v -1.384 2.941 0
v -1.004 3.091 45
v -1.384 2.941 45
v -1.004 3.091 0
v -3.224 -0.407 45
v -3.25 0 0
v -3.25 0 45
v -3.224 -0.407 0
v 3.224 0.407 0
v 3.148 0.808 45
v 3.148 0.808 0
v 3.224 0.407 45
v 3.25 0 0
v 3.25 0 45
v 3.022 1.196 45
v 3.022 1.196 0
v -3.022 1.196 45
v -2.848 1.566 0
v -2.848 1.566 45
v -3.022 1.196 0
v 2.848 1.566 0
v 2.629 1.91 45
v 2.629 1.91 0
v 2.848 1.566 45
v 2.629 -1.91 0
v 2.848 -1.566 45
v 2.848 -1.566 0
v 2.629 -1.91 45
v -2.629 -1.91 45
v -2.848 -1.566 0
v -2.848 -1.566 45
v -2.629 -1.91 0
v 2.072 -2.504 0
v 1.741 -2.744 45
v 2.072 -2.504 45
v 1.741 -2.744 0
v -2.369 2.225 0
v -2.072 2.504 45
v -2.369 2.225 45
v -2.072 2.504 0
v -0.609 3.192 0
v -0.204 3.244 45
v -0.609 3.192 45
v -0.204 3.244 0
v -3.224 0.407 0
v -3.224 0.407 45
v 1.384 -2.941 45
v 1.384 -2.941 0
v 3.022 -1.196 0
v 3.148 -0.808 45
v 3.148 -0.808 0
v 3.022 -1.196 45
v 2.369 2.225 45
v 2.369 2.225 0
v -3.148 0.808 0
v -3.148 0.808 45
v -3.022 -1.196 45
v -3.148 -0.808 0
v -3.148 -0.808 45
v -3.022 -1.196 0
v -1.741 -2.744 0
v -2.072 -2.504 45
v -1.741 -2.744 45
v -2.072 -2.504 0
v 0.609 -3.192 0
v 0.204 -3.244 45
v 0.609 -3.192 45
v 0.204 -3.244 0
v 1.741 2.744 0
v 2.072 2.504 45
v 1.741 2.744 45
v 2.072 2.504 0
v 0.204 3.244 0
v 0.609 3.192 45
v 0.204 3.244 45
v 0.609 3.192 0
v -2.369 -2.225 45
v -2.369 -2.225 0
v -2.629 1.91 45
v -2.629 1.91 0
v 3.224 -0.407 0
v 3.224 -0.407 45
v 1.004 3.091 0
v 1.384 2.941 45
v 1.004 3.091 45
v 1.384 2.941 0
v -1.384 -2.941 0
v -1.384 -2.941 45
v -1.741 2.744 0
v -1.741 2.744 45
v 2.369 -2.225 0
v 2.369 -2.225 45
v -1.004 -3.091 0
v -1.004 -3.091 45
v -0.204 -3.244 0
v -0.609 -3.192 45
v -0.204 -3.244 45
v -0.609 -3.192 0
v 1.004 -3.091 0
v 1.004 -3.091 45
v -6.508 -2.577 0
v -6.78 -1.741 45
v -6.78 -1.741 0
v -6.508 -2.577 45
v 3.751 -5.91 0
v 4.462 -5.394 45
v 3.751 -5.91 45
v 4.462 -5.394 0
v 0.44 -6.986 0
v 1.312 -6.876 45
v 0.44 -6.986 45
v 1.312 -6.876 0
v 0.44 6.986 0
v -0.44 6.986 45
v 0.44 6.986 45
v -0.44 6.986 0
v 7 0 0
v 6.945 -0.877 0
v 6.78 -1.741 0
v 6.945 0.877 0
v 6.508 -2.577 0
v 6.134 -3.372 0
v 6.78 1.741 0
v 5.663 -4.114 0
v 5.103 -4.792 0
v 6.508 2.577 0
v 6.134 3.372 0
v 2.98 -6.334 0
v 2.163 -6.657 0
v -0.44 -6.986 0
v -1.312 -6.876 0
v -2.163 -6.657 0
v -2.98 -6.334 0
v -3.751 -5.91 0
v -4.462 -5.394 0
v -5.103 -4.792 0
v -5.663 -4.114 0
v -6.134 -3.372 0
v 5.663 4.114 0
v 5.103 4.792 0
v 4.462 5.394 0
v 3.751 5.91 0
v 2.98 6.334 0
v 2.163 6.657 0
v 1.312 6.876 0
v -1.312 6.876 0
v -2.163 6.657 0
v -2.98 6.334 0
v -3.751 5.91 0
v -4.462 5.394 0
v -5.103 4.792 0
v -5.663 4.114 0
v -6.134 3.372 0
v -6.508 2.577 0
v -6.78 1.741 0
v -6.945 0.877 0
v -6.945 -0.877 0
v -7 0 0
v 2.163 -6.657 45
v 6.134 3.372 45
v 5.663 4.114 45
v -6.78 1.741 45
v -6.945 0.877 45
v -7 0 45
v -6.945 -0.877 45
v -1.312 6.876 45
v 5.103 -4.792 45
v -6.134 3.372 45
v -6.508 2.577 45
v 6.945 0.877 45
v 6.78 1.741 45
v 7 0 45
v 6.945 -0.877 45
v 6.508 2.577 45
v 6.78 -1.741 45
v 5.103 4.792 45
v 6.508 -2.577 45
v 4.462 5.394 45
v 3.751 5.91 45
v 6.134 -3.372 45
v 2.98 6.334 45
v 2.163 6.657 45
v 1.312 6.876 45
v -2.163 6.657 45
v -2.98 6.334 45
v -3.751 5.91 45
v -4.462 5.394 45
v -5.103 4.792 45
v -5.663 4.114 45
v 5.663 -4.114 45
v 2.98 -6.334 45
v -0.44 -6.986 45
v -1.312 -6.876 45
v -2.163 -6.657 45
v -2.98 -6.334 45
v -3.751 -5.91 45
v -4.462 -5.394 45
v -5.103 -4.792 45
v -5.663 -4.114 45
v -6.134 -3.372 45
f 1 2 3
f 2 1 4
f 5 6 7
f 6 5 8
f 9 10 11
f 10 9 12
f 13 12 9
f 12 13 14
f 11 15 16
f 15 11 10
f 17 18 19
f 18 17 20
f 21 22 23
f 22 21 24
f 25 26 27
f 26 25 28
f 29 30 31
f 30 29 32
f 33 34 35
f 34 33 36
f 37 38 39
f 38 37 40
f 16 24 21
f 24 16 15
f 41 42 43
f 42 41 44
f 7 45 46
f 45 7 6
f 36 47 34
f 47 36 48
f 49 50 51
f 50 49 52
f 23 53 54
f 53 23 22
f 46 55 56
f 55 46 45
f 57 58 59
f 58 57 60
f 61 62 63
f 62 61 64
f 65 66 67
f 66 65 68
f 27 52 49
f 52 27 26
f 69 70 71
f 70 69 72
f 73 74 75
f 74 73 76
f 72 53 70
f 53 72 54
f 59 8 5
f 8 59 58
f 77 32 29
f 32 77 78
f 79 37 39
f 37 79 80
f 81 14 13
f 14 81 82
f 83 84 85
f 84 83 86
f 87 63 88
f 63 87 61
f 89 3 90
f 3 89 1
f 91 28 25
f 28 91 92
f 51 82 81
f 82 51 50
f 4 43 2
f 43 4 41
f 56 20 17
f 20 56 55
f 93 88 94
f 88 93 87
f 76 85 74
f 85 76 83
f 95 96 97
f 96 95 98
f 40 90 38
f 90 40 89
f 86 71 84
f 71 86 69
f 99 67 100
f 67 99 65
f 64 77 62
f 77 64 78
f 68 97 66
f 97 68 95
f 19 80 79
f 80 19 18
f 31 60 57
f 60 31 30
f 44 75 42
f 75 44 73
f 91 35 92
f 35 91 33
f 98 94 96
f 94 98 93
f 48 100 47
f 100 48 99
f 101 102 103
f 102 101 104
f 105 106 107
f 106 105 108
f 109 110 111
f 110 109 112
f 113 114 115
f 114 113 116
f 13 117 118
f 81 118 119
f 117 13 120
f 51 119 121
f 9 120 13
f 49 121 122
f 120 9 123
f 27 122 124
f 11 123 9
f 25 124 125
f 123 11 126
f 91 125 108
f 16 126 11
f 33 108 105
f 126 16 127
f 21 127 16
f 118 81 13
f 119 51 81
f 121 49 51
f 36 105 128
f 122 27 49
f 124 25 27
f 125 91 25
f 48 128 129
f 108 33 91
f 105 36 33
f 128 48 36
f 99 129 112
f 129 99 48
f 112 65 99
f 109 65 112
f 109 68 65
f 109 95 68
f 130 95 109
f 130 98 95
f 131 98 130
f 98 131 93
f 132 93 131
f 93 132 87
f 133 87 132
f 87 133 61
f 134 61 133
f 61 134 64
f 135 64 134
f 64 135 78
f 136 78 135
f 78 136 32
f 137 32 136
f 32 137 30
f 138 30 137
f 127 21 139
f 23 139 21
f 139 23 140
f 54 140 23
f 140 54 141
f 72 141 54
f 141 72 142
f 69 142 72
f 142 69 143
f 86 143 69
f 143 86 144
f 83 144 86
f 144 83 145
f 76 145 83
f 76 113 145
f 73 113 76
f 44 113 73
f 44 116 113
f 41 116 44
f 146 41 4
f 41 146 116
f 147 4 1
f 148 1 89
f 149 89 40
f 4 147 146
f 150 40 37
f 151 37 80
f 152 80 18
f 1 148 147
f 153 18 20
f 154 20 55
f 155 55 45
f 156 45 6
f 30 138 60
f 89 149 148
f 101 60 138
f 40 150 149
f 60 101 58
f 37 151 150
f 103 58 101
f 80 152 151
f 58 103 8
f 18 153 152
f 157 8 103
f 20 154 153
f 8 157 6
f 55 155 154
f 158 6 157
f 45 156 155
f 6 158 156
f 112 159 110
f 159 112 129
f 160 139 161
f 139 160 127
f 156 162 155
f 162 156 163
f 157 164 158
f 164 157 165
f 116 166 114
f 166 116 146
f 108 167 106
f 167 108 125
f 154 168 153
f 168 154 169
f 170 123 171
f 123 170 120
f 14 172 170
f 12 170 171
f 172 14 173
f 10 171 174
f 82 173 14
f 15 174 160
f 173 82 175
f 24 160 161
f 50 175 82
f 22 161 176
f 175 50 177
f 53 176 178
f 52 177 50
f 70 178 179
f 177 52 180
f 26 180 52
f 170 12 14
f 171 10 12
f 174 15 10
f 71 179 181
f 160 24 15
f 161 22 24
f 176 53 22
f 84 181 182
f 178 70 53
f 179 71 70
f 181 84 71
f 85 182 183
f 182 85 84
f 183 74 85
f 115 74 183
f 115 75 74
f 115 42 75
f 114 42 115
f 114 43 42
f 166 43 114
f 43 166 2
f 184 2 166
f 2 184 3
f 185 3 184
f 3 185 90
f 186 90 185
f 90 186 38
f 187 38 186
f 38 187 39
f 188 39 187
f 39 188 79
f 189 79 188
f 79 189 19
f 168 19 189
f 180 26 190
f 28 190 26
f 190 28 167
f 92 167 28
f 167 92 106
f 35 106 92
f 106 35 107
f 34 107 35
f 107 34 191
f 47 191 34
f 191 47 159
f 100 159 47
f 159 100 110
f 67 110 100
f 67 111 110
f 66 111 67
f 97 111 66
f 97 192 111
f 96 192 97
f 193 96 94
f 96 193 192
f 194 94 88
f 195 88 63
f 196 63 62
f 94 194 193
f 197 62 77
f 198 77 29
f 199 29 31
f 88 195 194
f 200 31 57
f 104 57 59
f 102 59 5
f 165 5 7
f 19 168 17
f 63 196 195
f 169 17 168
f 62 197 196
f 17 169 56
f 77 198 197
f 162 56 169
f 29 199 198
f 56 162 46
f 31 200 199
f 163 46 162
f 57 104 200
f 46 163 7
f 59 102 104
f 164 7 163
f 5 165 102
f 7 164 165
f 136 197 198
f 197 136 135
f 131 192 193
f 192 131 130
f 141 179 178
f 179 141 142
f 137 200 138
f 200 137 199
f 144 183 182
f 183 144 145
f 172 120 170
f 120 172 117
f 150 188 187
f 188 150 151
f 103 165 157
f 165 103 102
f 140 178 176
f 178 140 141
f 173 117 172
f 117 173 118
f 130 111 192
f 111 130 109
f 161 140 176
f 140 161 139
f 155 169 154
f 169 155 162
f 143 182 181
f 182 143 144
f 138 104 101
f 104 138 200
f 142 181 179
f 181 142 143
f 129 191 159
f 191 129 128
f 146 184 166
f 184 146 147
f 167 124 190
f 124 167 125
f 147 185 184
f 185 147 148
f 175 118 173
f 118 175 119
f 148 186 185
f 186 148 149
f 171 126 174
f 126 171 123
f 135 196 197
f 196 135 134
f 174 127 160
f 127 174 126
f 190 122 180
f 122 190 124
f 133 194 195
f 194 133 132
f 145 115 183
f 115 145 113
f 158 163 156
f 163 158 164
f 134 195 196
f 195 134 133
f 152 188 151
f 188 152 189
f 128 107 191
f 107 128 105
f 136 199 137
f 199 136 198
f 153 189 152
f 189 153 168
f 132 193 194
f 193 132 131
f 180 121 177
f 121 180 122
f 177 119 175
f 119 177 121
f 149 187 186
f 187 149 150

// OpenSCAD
$fn = 50;

difference() {
	union() {
		cylinder(h = 45, r = 7.0);
	}
	union() {
		translate(v = [0, 0, -100]) {
			cylinder(h = 200, r = 3.25);
		}
		translate(v = [0, 0, -100]) {
			cylinder(h = 200, r = 1.8);
		}
	}
}
